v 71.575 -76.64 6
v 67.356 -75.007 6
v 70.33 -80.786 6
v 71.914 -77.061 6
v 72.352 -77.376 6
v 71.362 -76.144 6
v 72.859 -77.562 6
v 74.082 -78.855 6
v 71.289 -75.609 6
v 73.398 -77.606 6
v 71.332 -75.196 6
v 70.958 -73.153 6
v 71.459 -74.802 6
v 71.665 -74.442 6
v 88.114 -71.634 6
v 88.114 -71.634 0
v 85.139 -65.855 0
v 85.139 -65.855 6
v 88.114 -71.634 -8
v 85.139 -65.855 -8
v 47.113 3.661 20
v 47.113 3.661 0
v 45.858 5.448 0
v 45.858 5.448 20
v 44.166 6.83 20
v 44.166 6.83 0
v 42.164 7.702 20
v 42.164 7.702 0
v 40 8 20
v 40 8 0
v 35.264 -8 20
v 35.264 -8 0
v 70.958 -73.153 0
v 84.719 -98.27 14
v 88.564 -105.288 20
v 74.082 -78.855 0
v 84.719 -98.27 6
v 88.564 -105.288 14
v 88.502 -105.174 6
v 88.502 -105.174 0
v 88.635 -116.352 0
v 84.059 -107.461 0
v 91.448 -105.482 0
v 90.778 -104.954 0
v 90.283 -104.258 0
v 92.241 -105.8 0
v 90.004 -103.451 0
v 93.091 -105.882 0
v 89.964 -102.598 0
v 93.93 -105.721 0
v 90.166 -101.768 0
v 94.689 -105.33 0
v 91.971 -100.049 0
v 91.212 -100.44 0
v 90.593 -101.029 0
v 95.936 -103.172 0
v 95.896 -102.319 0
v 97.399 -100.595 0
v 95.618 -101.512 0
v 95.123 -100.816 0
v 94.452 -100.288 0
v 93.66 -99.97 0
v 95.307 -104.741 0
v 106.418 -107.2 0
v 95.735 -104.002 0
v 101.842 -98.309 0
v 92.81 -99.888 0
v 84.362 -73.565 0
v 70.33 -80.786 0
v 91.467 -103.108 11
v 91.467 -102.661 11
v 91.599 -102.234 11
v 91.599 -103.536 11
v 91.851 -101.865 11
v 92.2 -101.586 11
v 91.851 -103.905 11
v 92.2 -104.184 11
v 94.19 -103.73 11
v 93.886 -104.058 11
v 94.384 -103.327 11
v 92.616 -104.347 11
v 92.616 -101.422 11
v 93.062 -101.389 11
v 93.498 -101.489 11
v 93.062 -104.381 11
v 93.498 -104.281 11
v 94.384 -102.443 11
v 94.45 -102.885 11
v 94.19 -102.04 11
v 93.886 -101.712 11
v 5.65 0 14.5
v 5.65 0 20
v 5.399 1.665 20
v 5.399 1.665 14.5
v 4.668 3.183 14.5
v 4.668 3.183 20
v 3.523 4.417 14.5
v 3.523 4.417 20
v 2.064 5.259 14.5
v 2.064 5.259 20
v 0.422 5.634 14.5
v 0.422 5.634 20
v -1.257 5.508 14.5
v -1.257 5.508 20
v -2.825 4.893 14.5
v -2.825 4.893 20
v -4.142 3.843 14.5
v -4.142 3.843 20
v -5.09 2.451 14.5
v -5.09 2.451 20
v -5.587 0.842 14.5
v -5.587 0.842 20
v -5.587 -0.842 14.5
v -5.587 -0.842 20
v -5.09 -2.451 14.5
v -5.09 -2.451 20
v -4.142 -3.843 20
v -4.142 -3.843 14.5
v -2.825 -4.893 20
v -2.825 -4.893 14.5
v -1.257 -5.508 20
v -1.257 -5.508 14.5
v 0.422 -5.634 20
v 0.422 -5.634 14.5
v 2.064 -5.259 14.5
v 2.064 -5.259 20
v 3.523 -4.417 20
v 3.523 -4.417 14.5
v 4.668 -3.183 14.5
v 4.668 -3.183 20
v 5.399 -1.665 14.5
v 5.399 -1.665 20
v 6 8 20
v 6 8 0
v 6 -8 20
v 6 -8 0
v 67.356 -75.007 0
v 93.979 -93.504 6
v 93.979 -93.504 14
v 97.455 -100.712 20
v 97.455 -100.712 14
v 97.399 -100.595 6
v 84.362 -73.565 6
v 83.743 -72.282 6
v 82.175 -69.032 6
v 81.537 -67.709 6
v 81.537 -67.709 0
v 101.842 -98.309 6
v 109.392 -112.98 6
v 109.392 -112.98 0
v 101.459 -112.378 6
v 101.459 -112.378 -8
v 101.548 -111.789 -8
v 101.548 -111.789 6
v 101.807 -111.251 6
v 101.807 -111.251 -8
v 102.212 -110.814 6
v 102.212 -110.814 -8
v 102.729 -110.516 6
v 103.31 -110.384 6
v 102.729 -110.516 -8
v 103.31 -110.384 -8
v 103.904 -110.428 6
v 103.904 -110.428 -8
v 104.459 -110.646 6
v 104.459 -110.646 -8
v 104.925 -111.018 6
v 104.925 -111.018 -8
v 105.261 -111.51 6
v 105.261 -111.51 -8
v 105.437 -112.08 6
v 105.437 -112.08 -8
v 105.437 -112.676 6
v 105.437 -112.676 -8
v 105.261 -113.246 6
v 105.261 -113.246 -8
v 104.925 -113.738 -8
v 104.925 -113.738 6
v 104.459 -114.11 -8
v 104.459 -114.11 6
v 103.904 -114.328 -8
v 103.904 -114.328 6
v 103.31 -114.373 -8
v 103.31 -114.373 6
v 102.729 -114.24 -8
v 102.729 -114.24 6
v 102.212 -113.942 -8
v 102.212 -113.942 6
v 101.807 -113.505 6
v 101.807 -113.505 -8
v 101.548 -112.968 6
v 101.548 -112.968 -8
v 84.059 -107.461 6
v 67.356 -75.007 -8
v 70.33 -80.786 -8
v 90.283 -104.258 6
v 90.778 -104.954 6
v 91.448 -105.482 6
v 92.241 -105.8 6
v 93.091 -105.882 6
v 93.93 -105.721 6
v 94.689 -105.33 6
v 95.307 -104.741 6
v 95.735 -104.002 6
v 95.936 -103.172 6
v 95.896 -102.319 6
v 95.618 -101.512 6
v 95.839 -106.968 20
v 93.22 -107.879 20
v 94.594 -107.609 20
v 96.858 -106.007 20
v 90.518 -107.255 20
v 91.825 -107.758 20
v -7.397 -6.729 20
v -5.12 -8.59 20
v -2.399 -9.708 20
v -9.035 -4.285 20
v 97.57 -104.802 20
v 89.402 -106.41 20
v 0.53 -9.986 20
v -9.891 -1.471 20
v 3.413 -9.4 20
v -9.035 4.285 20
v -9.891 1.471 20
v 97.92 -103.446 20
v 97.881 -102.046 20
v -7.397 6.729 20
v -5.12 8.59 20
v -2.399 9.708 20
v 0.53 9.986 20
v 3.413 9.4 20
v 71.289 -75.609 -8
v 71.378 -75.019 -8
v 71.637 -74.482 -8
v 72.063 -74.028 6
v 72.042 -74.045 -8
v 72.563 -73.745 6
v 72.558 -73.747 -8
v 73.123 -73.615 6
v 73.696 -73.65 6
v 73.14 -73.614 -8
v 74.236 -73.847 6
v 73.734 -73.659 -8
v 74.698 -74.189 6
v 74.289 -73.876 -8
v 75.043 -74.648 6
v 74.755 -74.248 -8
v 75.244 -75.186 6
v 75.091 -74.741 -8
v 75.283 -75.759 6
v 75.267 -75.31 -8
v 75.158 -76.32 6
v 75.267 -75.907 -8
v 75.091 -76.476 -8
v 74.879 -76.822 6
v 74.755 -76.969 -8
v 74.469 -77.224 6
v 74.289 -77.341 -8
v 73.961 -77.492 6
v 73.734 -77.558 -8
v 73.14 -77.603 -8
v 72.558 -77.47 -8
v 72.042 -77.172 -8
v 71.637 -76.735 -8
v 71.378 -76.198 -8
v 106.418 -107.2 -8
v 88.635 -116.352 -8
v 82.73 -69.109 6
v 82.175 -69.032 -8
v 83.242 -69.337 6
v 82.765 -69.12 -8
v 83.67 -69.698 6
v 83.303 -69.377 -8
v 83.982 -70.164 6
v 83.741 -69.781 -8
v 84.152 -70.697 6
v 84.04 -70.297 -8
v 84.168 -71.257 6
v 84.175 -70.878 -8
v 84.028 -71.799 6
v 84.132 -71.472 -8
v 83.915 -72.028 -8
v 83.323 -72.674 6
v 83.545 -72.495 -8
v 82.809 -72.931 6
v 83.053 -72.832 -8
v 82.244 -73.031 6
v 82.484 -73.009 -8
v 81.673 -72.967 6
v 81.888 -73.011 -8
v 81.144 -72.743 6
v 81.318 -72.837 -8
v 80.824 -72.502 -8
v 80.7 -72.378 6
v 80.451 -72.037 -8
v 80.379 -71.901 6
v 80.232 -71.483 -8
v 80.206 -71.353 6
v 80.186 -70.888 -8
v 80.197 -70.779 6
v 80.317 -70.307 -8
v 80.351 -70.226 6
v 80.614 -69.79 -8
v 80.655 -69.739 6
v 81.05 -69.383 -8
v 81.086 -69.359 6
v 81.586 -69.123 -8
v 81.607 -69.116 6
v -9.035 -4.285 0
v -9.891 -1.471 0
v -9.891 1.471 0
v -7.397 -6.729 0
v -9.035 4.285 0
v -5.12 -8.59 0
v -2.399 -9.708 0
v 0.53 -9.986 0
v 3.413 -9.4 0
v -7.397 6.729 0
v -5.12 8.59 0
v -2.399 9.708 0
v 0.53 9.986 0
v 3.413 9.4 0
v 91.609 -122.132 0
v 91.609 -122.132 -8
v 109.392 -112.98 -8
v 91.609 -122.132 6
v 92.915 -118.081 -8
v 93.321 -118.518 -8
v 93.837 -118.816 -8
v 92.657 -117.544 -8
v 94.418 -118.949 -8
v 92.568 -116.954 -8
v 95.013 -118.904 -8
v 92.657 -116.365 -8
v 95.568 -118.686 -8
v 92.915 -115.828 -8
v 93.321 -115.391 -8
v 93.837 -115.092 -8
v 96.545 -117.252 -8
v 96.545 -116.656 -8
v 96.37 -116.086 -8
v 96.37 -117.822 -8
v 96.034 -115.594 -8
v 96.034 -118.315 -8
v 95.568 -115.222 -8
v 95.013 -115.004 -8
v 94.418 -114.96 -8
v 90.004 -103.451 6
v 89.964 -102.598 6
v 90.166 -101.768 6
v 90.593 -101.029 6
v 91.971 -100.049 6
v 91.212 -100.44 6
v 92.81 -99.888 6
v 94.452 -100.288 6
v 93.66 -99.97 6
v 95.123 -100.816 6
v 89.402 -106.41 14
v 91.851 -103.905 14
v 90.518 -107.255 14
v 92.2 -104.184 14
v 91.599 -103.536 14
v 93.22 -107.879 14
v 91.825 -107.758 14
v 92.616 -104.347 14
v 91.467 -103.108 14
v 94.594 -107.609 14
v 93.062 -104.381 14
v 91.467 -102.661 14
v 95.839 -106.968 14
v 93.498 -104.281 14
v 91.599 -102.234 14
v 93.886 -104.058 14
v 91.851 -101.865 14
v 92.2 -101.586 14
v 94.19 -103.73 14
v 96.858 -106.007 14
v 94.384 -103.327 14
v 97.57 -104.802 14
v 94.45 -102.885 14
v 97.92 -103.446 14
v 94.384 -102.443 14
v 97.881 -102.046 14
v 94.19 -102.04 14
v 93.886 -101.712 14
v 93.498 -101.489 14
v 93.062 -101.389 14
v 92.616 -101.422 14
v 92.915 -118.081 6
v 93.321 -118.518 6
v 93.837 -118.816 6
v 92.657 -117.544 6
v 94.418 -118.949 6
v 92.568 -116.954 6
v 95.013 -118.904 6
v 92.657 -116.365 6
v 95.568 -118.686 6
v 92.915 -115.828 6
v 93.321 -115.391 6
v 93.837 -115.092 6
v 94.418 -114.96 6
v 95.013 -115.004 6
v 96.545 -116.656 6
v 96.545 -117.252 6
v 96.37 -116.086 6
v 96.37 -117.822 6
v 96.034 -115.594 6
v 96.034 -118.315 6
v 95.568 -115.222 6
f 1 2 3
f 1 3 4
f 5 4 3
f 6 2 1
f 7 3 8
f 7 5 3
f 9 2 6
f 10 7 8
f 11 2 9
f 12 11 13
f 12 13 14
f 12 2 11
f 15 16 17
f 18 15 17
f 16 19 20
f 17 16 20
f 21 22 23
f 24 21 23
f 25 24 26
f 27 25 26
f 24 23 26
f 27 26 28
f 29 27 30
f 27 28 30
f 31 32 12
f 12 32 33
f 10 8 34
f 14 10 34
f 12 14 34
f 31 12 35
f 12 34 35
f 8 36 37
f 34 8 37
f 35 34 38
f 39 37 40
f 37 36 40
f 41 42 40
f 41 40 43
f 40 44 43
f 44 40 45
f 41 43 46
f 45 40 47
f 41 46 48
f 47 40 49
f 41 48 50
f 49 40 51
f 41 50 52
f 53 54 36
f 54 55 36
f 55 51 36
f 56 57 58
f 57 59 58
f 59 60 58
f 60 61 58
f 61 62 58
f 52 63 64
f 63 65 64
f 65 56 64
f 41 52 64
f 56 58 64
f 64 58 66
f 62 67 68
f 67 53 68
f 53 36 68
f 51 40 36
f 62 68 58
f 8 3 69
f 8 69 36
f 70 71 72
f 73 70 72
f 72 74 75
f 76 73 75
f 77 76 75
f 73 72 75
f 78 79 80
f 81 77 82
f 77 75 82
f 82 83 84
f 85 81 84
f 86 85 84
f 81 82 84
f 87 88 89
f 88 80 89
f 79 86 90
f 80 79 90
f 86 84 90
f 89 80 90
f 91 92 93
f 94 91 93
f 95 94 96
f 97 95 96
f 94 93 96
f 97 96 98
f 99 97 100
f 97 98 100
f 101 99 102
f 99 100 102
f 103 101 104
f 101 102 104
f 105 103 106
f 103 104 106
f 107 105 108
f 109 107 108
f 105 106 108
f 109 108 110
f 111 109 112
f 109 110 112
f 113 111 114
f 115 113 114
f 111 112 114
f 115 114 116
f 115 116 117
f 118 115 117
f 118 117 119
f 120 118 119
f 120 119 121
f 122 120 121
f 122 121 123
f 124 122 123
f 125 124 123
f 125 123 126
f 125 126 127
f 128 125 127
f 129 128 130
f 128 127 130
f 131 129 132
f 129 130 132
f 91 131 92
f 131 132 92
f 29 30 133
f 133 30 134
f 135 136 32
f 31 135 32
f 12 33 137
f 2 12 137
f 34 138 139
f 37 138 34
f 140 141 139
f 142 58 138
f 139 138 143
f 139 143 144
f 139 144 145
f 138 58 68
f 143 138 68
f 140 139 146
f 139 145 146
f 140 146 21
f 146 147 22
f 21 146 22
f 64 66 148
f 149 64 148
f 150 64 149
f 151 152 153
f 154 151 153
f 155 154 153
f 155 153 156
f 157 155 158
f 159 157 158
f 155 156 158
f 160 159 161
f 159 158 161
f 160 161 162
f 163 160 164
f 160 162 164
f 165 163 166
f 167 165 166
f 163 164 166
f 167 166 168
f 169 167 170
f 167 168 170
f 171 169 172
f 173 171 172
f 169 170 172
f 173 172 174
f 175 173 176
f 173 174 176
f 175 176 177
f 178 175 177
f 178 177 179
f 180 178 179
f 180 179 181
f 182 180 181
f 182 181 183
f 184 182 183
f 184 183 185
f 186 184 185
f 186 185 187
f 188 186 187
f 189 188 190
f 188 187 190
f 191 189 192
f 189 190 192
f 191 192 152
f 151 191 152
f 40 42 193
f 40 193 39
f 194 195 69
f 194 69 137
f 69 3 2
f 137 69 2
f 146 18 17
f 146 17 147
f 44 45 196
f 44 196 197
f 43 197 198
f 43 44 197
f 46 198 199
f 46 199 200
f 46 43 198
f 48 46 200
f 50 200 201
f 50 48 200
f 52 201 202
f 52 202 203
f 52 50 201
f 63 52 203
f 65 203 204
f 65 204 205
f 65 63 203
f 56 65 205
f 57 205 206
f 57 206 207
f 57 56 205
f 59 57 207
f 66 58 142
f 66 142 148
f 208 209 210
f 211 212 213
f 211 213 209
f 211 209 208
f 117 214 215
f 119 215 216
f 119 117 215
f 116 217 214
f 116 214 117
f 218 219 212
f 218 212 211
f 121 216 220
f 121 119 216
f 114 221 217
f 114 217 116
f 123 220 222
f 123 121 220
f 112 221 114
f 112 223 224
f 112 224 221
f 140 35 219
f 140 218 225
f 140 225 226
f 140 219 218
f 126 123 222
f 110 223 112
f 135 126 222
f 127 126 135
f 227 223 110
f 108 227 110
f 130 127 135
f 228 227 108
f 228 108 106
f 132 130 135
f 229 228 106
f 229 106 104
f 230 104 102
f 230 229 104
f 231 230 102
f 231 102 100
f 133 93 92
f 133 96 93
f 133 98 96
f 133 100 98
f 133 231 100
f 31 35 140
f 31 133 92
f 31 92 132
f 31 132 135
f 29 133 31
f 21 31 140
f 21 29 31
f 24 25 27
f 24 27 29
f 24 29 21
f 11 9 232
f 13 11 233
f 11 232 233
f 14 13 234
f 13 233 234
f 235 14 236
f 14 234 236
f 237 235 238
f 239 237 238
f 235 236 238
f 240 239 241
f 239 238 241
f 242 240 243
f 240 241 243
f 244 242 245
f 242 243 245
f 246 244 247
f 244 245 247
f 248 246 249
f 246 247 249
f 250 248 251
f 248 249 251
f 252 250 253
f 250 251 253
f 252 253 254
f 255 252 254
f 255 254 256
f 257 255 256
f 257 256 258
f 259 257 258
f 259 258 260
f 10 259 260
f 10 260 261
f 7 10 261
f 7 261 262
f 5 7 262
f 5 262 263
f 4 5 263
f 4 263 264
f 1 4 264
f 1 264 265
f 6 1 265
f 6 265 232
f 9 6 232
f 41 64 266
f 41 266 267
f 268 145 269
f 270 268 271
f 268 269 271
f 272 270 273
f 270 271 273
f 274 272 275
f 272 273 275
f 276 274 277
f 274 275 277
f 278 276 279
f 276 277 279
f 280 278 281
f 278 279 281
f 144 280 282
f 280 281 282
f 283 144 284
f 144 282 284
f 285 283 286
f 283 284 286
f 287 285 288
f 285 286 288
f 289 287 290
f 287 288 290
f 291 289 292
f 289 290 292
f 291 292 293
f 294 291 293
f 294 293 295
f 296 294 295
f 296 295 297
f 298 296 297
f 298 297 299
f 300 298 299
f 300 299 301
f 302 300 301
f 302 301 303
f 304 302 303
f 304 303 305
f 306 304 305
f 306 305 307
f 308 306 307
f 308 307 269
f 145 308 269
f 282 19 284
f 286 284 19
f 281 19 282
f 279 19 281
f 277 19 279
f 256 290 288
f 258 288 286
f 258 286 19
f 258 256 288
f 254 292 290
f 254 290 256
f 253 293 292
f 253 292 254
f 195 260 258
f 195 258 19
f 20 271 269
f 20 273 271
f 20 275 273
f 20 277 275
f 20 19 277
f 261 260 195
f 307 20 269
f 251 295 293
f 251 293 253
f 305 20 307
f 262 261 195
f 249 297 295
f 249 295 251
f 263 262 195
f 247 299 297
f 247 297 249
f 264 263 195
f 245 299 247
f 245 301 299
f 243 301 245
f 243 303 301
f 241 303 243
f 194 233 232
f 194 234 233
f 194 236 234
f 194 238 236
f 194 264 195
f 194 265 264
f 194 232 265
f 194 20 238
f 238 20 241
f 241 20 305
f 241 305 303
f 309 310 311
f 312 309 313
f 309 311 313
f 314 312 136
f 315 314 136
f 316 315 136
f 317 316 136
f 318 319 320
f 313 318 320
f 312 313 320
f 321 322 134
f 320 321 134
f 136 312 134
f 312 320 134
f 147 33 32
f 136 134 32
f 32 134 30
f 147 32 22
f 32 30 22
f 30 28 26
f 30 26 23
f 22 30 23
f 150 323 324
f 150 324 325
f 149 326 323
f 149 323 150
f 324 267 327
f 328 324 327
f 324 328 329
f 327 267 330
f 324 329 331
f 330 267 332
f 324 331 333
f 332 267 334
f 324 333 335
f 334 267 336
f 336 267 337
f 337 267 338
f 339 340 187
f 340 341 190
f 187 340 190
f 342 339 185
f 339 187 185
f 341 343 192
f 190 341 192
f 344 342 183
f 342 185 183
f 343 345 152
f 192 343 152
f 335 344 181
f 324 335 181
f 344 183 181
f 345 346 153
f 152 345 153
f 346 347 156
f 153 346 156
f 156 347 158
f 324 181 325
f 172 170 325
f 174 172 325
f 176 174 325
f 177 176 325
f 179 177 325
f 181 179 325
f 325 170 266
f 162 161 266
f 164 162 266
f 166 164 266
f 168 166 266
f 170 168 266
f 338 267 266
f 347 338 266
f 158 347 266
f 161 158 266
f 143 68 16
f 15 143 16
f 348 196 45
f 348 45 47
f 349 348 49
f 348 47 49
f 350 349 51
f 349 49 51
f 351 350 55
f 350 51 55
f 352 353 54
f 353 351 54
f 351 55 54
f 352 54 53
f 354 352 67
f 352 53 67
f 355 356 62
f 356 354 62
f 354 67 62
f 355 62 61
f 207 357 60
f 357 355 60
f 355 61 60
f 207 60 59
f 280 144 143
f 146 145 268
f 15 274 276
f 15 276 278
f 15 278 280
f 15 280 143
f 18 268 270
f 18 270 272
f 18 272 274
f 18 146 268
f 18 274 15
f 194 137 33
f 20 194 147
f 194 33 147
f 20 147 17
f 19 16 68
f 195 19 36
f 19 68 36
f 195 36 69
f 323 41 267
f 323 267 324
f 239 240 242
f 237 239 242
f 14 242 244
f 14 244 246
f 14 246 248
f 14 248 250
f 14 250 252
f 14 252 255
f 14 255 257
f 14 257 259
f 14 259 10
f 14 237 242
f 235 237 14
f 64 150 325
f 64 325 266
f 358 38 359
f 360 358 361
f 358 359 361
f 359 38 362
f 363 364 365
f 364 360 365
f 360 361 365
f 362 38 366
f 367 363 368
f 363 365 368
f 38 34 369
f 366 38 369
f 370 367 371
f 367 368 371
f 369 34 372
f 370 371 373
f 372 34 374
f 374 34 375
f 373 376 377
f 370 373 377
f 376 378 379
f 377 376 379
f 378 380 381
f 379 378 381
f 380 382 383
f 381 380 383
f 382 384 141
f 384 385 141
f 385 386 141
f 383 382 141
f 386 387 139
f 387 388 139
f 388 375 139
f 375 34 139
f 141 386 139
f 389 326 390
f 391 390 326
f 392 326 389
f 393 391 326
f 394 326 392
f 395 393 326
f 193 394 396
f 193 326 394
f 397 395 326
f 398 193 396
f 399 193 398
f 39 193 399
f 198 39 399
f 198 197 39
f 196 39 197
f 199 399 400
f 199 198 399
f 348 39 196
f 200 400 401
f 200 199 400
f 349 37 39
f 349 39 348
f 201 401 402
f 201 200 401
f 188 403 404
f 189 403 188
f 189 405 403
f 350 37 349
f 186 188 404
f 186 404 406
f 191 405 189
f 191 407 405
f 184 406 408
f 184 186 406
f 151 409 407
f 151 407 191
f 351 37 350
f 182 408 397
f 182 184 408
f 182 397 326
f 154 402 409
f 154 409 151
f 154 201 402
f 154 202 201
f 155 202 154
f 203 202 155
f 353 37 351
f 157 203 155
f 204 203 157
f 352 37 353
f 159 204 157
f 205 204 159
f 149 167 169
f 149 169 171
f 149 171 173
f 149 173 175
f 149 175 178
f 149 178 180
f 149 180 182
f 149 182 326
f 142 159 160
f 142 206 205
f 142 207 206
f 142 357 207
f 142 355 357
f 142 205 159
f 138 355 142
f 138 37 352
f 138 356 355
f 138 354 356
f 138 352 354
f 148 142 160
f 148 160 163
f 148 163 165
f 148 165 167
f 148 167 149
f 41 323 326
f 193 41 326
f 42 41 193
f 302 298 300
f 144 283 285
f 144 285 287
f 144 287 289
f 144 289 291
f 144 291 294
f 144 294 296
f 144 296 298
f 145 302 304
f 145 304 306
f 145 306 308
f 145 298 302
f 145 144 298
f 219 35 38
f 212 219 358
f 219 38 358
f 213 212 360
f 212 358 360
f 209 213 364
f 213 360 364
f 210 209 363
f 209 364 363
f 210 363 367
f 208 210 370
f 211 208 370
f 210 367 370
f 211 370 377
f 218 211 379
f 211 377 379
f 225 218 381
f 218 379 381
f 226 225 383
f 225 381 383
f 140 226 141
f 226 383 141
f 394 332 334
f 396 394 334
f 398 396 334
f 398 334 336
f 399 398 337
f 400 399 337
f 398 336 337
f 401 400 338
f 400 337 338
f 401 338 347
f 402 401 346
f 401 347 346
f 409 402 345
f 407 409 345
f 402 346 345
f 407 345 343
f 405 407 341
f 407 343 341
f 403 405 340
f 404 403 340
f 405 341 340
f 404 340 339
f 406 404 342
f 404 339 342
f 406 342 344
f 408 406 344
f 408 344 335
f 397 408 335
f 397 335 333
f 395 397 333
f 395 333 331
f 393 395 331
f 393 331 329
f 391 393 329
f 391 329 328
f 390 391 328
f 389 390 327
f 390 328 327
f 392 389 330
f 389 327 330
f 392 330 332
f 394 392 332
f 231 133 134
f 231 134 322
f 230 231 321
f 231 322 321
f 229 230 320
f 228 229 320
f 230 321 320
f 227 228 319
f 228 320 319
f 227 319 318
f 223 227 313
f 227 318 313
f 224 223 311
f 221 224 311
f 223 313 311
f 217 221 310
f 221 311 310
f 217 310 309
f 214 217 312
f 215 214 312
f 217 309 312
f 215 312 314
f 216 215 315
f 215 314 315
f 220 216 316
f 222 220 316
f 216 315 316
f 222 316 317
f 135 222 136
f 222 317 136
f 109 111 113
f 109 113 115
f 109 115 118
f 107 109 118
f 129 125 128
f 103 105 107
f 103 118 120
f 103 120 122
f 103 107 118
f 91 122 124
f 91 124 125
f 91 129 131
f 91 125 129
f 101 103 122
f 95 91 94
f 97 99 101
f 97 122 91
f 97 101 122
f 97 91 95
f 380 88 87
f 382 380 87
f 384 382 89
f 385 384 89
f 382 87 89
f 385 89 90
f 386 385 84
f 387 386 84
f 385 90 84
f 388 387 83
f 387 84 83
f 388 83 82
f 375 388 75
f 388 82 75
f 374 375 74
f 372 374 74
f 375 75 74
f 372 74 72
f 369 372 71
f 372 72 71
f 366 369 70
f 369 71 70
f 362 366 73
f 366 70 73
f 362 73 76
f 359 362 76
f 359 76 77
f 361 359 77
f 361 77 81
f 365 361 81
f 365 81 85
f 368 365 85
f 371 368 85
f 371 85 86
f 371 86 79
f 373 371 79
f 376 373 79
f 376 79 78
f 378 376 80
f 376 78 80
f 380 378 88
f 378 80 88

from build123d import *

# Parameters (mm, degrees)
EXTRUDE_1_DEPTH     = 20
SKETCH_2_R          = 5.65
CUT_EXTRUDE_1_DEPTH = 5.5
CUT_EXTRUDE_START   = -6
CUT_EXTRUDE_4_DEPTH = 8
EXTRUDE_START       = 5
SKETCH_5_R          = 1.5
EXTRUDE_2_DEPTH     = 3
CUT_EXTRUDE_5_REACH = 149.085
SKETCH_7_R          = 3
EXTRUDE_3_DEPTH     = 6
EXTRUDE_4_DEPTH     = 8
EXTRUDE_5_DEPTH     = 8
EXTRUDE_6_DEPTH     = 6
SKETCH_12_R         = 2
CUT_EXTRUDE_7_DEPTH = 14


with BuildPart() as part:
    # 草图1 → 凸台-拉伸1 (new body)
    with BuildSketch(Plane.XY):
        with BuildLine():
            Line((35.26398638, -8), (88.563757686, -105.288040462))
            ThreePointArc((88.563757686, -105.288040462), (95.239080336, -107.332125442), (97.455297675, -100.711959538))
            Line((97.455297675, -100.711959538), (47.113231991, 3.660864739))
            ThreePointArc((47.113231991, 3.660864739), (44.166118222, 6.829601669), (40, 8))
            Line((40, 8), (6, 8))
            ThreePointArc((6, 8), (-10, 0), (6, -8))
            Line((6, -8), (35.26398638, -8))
        make_face()
    extrude(amount=EXTRUDE_1_DEPTH)

    # 草图2 → 切除-拉伸1 (cut)
    with BuildSketch(Plane.XY.offset(20)):
        Circle(SKETCH_2_R)
    extrude(amount=-CUT_EXTRUDE_1_DEPTH, mode=Mode.SUBTRACT)

    # 草图4 → 切除-拉伸4 (cut)
    with BuildSketch(Plane(origin=(0, 0, 0), x_dir=(-1, 0, 0), z_dir=(0, 0, -1)).offset(CUT_EXTRUDE_START)):
        with BuildLine():
            Line((-97.455297675, -100.711959538), (-93.978649208, -93.503919609))
            Line((-93.978649208, -93.503919609), (-84.718676675, -98.269616408))
            Line((-84.718676675, -98.269616408), (-88.563757686, -105.288040462))
            ThreePointArc((-88.563757686, -105.288040462), (-95.297568142, -107.445769995), (-97.455297675, -100.711959538))
        make_face()
    extrude(amount=-CUT_EXTRUDE_4_DEPTH, mode=Mode.SUBTRACT)

    # 草图5 → 凸台-拉伸2 (add)
    with BuildSketch(Plane.XY.offset(6).offset(EXTRUDE_START)):
        with Locations((92.950272719, -102.88486483)):
            Circle(SKETCH_5_R)
    extrude(amount=EXTRUDE_2_DEPTH)

    # 草图7 → 切除-拉伸5 (cut, up to next)
    with BuildSketch(Plane(origin=(0, 0, 0), x_dir=(-1, 0, 0), z_dir=(0, 0, -1)), mode=Mode.PRIVATE) as cut_extrude_5_sk1:
        with Locations((-92.950272719, -102.88486483)):
            Circle(SKETCH_7_R)
    cut_extrude_5_tool1 = extrude(cut_extrude_5_sk1.sketch, amount=-CUT_EXTRUDE_5_REACH, mode=Mode.PRIVATE) & part.part
    add(cut_extrude_5_tool1.solids().sort_by_distance((92.950273, -102.884865, 0))[0], mode=Mode.SUBTRACT)

    # 草图8 → 凸台-拉伸3 (add)
    with BuildSketch(Plane(origin=(0, 0, 0), x_dir=(-1, 0, 0), z_dir=(0, 0, -1))):
        with BuildLine():
            Line((-95.617734716, -101.512040553), (-101.841812708, -98.308783906))
            Line((-101.841812708, -98.308783906), (-109.392346233, -112.979824888))
            Line((-109.392346233, -112.979824888), (-91.609266255, -122.131986736))
            Line((-91.609266255, -122.131986736), (-84.05873273, -107.460945754))
            Line((-84.05873273, -107.460945754), (-90.282810723, -104.257689107))
            ThreePointArc((-90.282810723, -104.257689107), (-94.323096996, -105.552326827), (-95.617734716, -101.512040553))
        make_face()
    extrude(amount=-EXTRUDE_3_DEPTH)

    # 草图9 → 凸台-拉伸4 (add)
    with BuildSketch(Plane(origin=(0, 0, 0), x_dir=(-1, 0, 0), z_dir=(0, 0, -1))):
        Polygon((-106.417893632, -107.200323895), (-88.634813654, -116.352485743), (-91.609266255, -122.131986736), (-109.392346233, -112.979824888), align=None)
    extrude(amount=EXTRUDE_4_DEPTH)

    # 草图10 → 凸台-拉伸5 (add)
    with BuildSketch(Plane(origin=(0, 0, 0), x_dir=(-1, 0, 0), z_dir=(0, 0, -1))):
        Polygon((-88.113569936, -71.634163939), (-70.330489958, -80.786325787), (-67.356037358, -75.006824794), (-85.139117336, -65.854662946), align=None)
    extrude(amount=EXTRUDE_5_DEPTH)

    # 草图11 → 凸台-拉伸6 (add)
    with BuildSketch(Plane.XY):
        Polygon((81.536815817, -67.708607626), (84.361592697, -73.565140068), (88.113569936, -71.634163939), (85.139117336, -65.854662946), align=None)
        Polygon((67.356037358, -75.006824794), (70.330489958, -80.786325787), (74.082467198, -78.855349657), (70.958338877, -73.152880114), align=None)
    extrude(amount=EXTRUDE_6_DEPTH)

    # 草图12 → 切除-拉伸7 (cut)
    with BuildSketch(Plane(origin=(0, 0, -8), x_dir=(-1, 0, 0), z_dir=(0, 0, -1))):
        with Locations((-103.459349938, -112.378114854)):
            Circle(SKETCH_12_R)
        with Locations((-94.567809949, -116.954195778)):
            Circle(SKETCH_12_R)
        with Locations((-73.289033653, -75.608534828)):
            Circle(SKETCH_12_R)
        with Locations(Location((-82.180573642, -71.032453904, 0), (0, 0, 89.850321616))):
            Circle(SKETCH_12_R)
    extrude(amount=-CUT_EXTRUDE_7_DEPTH, mode=Mode.SUBTRACT)


solid = part.part
